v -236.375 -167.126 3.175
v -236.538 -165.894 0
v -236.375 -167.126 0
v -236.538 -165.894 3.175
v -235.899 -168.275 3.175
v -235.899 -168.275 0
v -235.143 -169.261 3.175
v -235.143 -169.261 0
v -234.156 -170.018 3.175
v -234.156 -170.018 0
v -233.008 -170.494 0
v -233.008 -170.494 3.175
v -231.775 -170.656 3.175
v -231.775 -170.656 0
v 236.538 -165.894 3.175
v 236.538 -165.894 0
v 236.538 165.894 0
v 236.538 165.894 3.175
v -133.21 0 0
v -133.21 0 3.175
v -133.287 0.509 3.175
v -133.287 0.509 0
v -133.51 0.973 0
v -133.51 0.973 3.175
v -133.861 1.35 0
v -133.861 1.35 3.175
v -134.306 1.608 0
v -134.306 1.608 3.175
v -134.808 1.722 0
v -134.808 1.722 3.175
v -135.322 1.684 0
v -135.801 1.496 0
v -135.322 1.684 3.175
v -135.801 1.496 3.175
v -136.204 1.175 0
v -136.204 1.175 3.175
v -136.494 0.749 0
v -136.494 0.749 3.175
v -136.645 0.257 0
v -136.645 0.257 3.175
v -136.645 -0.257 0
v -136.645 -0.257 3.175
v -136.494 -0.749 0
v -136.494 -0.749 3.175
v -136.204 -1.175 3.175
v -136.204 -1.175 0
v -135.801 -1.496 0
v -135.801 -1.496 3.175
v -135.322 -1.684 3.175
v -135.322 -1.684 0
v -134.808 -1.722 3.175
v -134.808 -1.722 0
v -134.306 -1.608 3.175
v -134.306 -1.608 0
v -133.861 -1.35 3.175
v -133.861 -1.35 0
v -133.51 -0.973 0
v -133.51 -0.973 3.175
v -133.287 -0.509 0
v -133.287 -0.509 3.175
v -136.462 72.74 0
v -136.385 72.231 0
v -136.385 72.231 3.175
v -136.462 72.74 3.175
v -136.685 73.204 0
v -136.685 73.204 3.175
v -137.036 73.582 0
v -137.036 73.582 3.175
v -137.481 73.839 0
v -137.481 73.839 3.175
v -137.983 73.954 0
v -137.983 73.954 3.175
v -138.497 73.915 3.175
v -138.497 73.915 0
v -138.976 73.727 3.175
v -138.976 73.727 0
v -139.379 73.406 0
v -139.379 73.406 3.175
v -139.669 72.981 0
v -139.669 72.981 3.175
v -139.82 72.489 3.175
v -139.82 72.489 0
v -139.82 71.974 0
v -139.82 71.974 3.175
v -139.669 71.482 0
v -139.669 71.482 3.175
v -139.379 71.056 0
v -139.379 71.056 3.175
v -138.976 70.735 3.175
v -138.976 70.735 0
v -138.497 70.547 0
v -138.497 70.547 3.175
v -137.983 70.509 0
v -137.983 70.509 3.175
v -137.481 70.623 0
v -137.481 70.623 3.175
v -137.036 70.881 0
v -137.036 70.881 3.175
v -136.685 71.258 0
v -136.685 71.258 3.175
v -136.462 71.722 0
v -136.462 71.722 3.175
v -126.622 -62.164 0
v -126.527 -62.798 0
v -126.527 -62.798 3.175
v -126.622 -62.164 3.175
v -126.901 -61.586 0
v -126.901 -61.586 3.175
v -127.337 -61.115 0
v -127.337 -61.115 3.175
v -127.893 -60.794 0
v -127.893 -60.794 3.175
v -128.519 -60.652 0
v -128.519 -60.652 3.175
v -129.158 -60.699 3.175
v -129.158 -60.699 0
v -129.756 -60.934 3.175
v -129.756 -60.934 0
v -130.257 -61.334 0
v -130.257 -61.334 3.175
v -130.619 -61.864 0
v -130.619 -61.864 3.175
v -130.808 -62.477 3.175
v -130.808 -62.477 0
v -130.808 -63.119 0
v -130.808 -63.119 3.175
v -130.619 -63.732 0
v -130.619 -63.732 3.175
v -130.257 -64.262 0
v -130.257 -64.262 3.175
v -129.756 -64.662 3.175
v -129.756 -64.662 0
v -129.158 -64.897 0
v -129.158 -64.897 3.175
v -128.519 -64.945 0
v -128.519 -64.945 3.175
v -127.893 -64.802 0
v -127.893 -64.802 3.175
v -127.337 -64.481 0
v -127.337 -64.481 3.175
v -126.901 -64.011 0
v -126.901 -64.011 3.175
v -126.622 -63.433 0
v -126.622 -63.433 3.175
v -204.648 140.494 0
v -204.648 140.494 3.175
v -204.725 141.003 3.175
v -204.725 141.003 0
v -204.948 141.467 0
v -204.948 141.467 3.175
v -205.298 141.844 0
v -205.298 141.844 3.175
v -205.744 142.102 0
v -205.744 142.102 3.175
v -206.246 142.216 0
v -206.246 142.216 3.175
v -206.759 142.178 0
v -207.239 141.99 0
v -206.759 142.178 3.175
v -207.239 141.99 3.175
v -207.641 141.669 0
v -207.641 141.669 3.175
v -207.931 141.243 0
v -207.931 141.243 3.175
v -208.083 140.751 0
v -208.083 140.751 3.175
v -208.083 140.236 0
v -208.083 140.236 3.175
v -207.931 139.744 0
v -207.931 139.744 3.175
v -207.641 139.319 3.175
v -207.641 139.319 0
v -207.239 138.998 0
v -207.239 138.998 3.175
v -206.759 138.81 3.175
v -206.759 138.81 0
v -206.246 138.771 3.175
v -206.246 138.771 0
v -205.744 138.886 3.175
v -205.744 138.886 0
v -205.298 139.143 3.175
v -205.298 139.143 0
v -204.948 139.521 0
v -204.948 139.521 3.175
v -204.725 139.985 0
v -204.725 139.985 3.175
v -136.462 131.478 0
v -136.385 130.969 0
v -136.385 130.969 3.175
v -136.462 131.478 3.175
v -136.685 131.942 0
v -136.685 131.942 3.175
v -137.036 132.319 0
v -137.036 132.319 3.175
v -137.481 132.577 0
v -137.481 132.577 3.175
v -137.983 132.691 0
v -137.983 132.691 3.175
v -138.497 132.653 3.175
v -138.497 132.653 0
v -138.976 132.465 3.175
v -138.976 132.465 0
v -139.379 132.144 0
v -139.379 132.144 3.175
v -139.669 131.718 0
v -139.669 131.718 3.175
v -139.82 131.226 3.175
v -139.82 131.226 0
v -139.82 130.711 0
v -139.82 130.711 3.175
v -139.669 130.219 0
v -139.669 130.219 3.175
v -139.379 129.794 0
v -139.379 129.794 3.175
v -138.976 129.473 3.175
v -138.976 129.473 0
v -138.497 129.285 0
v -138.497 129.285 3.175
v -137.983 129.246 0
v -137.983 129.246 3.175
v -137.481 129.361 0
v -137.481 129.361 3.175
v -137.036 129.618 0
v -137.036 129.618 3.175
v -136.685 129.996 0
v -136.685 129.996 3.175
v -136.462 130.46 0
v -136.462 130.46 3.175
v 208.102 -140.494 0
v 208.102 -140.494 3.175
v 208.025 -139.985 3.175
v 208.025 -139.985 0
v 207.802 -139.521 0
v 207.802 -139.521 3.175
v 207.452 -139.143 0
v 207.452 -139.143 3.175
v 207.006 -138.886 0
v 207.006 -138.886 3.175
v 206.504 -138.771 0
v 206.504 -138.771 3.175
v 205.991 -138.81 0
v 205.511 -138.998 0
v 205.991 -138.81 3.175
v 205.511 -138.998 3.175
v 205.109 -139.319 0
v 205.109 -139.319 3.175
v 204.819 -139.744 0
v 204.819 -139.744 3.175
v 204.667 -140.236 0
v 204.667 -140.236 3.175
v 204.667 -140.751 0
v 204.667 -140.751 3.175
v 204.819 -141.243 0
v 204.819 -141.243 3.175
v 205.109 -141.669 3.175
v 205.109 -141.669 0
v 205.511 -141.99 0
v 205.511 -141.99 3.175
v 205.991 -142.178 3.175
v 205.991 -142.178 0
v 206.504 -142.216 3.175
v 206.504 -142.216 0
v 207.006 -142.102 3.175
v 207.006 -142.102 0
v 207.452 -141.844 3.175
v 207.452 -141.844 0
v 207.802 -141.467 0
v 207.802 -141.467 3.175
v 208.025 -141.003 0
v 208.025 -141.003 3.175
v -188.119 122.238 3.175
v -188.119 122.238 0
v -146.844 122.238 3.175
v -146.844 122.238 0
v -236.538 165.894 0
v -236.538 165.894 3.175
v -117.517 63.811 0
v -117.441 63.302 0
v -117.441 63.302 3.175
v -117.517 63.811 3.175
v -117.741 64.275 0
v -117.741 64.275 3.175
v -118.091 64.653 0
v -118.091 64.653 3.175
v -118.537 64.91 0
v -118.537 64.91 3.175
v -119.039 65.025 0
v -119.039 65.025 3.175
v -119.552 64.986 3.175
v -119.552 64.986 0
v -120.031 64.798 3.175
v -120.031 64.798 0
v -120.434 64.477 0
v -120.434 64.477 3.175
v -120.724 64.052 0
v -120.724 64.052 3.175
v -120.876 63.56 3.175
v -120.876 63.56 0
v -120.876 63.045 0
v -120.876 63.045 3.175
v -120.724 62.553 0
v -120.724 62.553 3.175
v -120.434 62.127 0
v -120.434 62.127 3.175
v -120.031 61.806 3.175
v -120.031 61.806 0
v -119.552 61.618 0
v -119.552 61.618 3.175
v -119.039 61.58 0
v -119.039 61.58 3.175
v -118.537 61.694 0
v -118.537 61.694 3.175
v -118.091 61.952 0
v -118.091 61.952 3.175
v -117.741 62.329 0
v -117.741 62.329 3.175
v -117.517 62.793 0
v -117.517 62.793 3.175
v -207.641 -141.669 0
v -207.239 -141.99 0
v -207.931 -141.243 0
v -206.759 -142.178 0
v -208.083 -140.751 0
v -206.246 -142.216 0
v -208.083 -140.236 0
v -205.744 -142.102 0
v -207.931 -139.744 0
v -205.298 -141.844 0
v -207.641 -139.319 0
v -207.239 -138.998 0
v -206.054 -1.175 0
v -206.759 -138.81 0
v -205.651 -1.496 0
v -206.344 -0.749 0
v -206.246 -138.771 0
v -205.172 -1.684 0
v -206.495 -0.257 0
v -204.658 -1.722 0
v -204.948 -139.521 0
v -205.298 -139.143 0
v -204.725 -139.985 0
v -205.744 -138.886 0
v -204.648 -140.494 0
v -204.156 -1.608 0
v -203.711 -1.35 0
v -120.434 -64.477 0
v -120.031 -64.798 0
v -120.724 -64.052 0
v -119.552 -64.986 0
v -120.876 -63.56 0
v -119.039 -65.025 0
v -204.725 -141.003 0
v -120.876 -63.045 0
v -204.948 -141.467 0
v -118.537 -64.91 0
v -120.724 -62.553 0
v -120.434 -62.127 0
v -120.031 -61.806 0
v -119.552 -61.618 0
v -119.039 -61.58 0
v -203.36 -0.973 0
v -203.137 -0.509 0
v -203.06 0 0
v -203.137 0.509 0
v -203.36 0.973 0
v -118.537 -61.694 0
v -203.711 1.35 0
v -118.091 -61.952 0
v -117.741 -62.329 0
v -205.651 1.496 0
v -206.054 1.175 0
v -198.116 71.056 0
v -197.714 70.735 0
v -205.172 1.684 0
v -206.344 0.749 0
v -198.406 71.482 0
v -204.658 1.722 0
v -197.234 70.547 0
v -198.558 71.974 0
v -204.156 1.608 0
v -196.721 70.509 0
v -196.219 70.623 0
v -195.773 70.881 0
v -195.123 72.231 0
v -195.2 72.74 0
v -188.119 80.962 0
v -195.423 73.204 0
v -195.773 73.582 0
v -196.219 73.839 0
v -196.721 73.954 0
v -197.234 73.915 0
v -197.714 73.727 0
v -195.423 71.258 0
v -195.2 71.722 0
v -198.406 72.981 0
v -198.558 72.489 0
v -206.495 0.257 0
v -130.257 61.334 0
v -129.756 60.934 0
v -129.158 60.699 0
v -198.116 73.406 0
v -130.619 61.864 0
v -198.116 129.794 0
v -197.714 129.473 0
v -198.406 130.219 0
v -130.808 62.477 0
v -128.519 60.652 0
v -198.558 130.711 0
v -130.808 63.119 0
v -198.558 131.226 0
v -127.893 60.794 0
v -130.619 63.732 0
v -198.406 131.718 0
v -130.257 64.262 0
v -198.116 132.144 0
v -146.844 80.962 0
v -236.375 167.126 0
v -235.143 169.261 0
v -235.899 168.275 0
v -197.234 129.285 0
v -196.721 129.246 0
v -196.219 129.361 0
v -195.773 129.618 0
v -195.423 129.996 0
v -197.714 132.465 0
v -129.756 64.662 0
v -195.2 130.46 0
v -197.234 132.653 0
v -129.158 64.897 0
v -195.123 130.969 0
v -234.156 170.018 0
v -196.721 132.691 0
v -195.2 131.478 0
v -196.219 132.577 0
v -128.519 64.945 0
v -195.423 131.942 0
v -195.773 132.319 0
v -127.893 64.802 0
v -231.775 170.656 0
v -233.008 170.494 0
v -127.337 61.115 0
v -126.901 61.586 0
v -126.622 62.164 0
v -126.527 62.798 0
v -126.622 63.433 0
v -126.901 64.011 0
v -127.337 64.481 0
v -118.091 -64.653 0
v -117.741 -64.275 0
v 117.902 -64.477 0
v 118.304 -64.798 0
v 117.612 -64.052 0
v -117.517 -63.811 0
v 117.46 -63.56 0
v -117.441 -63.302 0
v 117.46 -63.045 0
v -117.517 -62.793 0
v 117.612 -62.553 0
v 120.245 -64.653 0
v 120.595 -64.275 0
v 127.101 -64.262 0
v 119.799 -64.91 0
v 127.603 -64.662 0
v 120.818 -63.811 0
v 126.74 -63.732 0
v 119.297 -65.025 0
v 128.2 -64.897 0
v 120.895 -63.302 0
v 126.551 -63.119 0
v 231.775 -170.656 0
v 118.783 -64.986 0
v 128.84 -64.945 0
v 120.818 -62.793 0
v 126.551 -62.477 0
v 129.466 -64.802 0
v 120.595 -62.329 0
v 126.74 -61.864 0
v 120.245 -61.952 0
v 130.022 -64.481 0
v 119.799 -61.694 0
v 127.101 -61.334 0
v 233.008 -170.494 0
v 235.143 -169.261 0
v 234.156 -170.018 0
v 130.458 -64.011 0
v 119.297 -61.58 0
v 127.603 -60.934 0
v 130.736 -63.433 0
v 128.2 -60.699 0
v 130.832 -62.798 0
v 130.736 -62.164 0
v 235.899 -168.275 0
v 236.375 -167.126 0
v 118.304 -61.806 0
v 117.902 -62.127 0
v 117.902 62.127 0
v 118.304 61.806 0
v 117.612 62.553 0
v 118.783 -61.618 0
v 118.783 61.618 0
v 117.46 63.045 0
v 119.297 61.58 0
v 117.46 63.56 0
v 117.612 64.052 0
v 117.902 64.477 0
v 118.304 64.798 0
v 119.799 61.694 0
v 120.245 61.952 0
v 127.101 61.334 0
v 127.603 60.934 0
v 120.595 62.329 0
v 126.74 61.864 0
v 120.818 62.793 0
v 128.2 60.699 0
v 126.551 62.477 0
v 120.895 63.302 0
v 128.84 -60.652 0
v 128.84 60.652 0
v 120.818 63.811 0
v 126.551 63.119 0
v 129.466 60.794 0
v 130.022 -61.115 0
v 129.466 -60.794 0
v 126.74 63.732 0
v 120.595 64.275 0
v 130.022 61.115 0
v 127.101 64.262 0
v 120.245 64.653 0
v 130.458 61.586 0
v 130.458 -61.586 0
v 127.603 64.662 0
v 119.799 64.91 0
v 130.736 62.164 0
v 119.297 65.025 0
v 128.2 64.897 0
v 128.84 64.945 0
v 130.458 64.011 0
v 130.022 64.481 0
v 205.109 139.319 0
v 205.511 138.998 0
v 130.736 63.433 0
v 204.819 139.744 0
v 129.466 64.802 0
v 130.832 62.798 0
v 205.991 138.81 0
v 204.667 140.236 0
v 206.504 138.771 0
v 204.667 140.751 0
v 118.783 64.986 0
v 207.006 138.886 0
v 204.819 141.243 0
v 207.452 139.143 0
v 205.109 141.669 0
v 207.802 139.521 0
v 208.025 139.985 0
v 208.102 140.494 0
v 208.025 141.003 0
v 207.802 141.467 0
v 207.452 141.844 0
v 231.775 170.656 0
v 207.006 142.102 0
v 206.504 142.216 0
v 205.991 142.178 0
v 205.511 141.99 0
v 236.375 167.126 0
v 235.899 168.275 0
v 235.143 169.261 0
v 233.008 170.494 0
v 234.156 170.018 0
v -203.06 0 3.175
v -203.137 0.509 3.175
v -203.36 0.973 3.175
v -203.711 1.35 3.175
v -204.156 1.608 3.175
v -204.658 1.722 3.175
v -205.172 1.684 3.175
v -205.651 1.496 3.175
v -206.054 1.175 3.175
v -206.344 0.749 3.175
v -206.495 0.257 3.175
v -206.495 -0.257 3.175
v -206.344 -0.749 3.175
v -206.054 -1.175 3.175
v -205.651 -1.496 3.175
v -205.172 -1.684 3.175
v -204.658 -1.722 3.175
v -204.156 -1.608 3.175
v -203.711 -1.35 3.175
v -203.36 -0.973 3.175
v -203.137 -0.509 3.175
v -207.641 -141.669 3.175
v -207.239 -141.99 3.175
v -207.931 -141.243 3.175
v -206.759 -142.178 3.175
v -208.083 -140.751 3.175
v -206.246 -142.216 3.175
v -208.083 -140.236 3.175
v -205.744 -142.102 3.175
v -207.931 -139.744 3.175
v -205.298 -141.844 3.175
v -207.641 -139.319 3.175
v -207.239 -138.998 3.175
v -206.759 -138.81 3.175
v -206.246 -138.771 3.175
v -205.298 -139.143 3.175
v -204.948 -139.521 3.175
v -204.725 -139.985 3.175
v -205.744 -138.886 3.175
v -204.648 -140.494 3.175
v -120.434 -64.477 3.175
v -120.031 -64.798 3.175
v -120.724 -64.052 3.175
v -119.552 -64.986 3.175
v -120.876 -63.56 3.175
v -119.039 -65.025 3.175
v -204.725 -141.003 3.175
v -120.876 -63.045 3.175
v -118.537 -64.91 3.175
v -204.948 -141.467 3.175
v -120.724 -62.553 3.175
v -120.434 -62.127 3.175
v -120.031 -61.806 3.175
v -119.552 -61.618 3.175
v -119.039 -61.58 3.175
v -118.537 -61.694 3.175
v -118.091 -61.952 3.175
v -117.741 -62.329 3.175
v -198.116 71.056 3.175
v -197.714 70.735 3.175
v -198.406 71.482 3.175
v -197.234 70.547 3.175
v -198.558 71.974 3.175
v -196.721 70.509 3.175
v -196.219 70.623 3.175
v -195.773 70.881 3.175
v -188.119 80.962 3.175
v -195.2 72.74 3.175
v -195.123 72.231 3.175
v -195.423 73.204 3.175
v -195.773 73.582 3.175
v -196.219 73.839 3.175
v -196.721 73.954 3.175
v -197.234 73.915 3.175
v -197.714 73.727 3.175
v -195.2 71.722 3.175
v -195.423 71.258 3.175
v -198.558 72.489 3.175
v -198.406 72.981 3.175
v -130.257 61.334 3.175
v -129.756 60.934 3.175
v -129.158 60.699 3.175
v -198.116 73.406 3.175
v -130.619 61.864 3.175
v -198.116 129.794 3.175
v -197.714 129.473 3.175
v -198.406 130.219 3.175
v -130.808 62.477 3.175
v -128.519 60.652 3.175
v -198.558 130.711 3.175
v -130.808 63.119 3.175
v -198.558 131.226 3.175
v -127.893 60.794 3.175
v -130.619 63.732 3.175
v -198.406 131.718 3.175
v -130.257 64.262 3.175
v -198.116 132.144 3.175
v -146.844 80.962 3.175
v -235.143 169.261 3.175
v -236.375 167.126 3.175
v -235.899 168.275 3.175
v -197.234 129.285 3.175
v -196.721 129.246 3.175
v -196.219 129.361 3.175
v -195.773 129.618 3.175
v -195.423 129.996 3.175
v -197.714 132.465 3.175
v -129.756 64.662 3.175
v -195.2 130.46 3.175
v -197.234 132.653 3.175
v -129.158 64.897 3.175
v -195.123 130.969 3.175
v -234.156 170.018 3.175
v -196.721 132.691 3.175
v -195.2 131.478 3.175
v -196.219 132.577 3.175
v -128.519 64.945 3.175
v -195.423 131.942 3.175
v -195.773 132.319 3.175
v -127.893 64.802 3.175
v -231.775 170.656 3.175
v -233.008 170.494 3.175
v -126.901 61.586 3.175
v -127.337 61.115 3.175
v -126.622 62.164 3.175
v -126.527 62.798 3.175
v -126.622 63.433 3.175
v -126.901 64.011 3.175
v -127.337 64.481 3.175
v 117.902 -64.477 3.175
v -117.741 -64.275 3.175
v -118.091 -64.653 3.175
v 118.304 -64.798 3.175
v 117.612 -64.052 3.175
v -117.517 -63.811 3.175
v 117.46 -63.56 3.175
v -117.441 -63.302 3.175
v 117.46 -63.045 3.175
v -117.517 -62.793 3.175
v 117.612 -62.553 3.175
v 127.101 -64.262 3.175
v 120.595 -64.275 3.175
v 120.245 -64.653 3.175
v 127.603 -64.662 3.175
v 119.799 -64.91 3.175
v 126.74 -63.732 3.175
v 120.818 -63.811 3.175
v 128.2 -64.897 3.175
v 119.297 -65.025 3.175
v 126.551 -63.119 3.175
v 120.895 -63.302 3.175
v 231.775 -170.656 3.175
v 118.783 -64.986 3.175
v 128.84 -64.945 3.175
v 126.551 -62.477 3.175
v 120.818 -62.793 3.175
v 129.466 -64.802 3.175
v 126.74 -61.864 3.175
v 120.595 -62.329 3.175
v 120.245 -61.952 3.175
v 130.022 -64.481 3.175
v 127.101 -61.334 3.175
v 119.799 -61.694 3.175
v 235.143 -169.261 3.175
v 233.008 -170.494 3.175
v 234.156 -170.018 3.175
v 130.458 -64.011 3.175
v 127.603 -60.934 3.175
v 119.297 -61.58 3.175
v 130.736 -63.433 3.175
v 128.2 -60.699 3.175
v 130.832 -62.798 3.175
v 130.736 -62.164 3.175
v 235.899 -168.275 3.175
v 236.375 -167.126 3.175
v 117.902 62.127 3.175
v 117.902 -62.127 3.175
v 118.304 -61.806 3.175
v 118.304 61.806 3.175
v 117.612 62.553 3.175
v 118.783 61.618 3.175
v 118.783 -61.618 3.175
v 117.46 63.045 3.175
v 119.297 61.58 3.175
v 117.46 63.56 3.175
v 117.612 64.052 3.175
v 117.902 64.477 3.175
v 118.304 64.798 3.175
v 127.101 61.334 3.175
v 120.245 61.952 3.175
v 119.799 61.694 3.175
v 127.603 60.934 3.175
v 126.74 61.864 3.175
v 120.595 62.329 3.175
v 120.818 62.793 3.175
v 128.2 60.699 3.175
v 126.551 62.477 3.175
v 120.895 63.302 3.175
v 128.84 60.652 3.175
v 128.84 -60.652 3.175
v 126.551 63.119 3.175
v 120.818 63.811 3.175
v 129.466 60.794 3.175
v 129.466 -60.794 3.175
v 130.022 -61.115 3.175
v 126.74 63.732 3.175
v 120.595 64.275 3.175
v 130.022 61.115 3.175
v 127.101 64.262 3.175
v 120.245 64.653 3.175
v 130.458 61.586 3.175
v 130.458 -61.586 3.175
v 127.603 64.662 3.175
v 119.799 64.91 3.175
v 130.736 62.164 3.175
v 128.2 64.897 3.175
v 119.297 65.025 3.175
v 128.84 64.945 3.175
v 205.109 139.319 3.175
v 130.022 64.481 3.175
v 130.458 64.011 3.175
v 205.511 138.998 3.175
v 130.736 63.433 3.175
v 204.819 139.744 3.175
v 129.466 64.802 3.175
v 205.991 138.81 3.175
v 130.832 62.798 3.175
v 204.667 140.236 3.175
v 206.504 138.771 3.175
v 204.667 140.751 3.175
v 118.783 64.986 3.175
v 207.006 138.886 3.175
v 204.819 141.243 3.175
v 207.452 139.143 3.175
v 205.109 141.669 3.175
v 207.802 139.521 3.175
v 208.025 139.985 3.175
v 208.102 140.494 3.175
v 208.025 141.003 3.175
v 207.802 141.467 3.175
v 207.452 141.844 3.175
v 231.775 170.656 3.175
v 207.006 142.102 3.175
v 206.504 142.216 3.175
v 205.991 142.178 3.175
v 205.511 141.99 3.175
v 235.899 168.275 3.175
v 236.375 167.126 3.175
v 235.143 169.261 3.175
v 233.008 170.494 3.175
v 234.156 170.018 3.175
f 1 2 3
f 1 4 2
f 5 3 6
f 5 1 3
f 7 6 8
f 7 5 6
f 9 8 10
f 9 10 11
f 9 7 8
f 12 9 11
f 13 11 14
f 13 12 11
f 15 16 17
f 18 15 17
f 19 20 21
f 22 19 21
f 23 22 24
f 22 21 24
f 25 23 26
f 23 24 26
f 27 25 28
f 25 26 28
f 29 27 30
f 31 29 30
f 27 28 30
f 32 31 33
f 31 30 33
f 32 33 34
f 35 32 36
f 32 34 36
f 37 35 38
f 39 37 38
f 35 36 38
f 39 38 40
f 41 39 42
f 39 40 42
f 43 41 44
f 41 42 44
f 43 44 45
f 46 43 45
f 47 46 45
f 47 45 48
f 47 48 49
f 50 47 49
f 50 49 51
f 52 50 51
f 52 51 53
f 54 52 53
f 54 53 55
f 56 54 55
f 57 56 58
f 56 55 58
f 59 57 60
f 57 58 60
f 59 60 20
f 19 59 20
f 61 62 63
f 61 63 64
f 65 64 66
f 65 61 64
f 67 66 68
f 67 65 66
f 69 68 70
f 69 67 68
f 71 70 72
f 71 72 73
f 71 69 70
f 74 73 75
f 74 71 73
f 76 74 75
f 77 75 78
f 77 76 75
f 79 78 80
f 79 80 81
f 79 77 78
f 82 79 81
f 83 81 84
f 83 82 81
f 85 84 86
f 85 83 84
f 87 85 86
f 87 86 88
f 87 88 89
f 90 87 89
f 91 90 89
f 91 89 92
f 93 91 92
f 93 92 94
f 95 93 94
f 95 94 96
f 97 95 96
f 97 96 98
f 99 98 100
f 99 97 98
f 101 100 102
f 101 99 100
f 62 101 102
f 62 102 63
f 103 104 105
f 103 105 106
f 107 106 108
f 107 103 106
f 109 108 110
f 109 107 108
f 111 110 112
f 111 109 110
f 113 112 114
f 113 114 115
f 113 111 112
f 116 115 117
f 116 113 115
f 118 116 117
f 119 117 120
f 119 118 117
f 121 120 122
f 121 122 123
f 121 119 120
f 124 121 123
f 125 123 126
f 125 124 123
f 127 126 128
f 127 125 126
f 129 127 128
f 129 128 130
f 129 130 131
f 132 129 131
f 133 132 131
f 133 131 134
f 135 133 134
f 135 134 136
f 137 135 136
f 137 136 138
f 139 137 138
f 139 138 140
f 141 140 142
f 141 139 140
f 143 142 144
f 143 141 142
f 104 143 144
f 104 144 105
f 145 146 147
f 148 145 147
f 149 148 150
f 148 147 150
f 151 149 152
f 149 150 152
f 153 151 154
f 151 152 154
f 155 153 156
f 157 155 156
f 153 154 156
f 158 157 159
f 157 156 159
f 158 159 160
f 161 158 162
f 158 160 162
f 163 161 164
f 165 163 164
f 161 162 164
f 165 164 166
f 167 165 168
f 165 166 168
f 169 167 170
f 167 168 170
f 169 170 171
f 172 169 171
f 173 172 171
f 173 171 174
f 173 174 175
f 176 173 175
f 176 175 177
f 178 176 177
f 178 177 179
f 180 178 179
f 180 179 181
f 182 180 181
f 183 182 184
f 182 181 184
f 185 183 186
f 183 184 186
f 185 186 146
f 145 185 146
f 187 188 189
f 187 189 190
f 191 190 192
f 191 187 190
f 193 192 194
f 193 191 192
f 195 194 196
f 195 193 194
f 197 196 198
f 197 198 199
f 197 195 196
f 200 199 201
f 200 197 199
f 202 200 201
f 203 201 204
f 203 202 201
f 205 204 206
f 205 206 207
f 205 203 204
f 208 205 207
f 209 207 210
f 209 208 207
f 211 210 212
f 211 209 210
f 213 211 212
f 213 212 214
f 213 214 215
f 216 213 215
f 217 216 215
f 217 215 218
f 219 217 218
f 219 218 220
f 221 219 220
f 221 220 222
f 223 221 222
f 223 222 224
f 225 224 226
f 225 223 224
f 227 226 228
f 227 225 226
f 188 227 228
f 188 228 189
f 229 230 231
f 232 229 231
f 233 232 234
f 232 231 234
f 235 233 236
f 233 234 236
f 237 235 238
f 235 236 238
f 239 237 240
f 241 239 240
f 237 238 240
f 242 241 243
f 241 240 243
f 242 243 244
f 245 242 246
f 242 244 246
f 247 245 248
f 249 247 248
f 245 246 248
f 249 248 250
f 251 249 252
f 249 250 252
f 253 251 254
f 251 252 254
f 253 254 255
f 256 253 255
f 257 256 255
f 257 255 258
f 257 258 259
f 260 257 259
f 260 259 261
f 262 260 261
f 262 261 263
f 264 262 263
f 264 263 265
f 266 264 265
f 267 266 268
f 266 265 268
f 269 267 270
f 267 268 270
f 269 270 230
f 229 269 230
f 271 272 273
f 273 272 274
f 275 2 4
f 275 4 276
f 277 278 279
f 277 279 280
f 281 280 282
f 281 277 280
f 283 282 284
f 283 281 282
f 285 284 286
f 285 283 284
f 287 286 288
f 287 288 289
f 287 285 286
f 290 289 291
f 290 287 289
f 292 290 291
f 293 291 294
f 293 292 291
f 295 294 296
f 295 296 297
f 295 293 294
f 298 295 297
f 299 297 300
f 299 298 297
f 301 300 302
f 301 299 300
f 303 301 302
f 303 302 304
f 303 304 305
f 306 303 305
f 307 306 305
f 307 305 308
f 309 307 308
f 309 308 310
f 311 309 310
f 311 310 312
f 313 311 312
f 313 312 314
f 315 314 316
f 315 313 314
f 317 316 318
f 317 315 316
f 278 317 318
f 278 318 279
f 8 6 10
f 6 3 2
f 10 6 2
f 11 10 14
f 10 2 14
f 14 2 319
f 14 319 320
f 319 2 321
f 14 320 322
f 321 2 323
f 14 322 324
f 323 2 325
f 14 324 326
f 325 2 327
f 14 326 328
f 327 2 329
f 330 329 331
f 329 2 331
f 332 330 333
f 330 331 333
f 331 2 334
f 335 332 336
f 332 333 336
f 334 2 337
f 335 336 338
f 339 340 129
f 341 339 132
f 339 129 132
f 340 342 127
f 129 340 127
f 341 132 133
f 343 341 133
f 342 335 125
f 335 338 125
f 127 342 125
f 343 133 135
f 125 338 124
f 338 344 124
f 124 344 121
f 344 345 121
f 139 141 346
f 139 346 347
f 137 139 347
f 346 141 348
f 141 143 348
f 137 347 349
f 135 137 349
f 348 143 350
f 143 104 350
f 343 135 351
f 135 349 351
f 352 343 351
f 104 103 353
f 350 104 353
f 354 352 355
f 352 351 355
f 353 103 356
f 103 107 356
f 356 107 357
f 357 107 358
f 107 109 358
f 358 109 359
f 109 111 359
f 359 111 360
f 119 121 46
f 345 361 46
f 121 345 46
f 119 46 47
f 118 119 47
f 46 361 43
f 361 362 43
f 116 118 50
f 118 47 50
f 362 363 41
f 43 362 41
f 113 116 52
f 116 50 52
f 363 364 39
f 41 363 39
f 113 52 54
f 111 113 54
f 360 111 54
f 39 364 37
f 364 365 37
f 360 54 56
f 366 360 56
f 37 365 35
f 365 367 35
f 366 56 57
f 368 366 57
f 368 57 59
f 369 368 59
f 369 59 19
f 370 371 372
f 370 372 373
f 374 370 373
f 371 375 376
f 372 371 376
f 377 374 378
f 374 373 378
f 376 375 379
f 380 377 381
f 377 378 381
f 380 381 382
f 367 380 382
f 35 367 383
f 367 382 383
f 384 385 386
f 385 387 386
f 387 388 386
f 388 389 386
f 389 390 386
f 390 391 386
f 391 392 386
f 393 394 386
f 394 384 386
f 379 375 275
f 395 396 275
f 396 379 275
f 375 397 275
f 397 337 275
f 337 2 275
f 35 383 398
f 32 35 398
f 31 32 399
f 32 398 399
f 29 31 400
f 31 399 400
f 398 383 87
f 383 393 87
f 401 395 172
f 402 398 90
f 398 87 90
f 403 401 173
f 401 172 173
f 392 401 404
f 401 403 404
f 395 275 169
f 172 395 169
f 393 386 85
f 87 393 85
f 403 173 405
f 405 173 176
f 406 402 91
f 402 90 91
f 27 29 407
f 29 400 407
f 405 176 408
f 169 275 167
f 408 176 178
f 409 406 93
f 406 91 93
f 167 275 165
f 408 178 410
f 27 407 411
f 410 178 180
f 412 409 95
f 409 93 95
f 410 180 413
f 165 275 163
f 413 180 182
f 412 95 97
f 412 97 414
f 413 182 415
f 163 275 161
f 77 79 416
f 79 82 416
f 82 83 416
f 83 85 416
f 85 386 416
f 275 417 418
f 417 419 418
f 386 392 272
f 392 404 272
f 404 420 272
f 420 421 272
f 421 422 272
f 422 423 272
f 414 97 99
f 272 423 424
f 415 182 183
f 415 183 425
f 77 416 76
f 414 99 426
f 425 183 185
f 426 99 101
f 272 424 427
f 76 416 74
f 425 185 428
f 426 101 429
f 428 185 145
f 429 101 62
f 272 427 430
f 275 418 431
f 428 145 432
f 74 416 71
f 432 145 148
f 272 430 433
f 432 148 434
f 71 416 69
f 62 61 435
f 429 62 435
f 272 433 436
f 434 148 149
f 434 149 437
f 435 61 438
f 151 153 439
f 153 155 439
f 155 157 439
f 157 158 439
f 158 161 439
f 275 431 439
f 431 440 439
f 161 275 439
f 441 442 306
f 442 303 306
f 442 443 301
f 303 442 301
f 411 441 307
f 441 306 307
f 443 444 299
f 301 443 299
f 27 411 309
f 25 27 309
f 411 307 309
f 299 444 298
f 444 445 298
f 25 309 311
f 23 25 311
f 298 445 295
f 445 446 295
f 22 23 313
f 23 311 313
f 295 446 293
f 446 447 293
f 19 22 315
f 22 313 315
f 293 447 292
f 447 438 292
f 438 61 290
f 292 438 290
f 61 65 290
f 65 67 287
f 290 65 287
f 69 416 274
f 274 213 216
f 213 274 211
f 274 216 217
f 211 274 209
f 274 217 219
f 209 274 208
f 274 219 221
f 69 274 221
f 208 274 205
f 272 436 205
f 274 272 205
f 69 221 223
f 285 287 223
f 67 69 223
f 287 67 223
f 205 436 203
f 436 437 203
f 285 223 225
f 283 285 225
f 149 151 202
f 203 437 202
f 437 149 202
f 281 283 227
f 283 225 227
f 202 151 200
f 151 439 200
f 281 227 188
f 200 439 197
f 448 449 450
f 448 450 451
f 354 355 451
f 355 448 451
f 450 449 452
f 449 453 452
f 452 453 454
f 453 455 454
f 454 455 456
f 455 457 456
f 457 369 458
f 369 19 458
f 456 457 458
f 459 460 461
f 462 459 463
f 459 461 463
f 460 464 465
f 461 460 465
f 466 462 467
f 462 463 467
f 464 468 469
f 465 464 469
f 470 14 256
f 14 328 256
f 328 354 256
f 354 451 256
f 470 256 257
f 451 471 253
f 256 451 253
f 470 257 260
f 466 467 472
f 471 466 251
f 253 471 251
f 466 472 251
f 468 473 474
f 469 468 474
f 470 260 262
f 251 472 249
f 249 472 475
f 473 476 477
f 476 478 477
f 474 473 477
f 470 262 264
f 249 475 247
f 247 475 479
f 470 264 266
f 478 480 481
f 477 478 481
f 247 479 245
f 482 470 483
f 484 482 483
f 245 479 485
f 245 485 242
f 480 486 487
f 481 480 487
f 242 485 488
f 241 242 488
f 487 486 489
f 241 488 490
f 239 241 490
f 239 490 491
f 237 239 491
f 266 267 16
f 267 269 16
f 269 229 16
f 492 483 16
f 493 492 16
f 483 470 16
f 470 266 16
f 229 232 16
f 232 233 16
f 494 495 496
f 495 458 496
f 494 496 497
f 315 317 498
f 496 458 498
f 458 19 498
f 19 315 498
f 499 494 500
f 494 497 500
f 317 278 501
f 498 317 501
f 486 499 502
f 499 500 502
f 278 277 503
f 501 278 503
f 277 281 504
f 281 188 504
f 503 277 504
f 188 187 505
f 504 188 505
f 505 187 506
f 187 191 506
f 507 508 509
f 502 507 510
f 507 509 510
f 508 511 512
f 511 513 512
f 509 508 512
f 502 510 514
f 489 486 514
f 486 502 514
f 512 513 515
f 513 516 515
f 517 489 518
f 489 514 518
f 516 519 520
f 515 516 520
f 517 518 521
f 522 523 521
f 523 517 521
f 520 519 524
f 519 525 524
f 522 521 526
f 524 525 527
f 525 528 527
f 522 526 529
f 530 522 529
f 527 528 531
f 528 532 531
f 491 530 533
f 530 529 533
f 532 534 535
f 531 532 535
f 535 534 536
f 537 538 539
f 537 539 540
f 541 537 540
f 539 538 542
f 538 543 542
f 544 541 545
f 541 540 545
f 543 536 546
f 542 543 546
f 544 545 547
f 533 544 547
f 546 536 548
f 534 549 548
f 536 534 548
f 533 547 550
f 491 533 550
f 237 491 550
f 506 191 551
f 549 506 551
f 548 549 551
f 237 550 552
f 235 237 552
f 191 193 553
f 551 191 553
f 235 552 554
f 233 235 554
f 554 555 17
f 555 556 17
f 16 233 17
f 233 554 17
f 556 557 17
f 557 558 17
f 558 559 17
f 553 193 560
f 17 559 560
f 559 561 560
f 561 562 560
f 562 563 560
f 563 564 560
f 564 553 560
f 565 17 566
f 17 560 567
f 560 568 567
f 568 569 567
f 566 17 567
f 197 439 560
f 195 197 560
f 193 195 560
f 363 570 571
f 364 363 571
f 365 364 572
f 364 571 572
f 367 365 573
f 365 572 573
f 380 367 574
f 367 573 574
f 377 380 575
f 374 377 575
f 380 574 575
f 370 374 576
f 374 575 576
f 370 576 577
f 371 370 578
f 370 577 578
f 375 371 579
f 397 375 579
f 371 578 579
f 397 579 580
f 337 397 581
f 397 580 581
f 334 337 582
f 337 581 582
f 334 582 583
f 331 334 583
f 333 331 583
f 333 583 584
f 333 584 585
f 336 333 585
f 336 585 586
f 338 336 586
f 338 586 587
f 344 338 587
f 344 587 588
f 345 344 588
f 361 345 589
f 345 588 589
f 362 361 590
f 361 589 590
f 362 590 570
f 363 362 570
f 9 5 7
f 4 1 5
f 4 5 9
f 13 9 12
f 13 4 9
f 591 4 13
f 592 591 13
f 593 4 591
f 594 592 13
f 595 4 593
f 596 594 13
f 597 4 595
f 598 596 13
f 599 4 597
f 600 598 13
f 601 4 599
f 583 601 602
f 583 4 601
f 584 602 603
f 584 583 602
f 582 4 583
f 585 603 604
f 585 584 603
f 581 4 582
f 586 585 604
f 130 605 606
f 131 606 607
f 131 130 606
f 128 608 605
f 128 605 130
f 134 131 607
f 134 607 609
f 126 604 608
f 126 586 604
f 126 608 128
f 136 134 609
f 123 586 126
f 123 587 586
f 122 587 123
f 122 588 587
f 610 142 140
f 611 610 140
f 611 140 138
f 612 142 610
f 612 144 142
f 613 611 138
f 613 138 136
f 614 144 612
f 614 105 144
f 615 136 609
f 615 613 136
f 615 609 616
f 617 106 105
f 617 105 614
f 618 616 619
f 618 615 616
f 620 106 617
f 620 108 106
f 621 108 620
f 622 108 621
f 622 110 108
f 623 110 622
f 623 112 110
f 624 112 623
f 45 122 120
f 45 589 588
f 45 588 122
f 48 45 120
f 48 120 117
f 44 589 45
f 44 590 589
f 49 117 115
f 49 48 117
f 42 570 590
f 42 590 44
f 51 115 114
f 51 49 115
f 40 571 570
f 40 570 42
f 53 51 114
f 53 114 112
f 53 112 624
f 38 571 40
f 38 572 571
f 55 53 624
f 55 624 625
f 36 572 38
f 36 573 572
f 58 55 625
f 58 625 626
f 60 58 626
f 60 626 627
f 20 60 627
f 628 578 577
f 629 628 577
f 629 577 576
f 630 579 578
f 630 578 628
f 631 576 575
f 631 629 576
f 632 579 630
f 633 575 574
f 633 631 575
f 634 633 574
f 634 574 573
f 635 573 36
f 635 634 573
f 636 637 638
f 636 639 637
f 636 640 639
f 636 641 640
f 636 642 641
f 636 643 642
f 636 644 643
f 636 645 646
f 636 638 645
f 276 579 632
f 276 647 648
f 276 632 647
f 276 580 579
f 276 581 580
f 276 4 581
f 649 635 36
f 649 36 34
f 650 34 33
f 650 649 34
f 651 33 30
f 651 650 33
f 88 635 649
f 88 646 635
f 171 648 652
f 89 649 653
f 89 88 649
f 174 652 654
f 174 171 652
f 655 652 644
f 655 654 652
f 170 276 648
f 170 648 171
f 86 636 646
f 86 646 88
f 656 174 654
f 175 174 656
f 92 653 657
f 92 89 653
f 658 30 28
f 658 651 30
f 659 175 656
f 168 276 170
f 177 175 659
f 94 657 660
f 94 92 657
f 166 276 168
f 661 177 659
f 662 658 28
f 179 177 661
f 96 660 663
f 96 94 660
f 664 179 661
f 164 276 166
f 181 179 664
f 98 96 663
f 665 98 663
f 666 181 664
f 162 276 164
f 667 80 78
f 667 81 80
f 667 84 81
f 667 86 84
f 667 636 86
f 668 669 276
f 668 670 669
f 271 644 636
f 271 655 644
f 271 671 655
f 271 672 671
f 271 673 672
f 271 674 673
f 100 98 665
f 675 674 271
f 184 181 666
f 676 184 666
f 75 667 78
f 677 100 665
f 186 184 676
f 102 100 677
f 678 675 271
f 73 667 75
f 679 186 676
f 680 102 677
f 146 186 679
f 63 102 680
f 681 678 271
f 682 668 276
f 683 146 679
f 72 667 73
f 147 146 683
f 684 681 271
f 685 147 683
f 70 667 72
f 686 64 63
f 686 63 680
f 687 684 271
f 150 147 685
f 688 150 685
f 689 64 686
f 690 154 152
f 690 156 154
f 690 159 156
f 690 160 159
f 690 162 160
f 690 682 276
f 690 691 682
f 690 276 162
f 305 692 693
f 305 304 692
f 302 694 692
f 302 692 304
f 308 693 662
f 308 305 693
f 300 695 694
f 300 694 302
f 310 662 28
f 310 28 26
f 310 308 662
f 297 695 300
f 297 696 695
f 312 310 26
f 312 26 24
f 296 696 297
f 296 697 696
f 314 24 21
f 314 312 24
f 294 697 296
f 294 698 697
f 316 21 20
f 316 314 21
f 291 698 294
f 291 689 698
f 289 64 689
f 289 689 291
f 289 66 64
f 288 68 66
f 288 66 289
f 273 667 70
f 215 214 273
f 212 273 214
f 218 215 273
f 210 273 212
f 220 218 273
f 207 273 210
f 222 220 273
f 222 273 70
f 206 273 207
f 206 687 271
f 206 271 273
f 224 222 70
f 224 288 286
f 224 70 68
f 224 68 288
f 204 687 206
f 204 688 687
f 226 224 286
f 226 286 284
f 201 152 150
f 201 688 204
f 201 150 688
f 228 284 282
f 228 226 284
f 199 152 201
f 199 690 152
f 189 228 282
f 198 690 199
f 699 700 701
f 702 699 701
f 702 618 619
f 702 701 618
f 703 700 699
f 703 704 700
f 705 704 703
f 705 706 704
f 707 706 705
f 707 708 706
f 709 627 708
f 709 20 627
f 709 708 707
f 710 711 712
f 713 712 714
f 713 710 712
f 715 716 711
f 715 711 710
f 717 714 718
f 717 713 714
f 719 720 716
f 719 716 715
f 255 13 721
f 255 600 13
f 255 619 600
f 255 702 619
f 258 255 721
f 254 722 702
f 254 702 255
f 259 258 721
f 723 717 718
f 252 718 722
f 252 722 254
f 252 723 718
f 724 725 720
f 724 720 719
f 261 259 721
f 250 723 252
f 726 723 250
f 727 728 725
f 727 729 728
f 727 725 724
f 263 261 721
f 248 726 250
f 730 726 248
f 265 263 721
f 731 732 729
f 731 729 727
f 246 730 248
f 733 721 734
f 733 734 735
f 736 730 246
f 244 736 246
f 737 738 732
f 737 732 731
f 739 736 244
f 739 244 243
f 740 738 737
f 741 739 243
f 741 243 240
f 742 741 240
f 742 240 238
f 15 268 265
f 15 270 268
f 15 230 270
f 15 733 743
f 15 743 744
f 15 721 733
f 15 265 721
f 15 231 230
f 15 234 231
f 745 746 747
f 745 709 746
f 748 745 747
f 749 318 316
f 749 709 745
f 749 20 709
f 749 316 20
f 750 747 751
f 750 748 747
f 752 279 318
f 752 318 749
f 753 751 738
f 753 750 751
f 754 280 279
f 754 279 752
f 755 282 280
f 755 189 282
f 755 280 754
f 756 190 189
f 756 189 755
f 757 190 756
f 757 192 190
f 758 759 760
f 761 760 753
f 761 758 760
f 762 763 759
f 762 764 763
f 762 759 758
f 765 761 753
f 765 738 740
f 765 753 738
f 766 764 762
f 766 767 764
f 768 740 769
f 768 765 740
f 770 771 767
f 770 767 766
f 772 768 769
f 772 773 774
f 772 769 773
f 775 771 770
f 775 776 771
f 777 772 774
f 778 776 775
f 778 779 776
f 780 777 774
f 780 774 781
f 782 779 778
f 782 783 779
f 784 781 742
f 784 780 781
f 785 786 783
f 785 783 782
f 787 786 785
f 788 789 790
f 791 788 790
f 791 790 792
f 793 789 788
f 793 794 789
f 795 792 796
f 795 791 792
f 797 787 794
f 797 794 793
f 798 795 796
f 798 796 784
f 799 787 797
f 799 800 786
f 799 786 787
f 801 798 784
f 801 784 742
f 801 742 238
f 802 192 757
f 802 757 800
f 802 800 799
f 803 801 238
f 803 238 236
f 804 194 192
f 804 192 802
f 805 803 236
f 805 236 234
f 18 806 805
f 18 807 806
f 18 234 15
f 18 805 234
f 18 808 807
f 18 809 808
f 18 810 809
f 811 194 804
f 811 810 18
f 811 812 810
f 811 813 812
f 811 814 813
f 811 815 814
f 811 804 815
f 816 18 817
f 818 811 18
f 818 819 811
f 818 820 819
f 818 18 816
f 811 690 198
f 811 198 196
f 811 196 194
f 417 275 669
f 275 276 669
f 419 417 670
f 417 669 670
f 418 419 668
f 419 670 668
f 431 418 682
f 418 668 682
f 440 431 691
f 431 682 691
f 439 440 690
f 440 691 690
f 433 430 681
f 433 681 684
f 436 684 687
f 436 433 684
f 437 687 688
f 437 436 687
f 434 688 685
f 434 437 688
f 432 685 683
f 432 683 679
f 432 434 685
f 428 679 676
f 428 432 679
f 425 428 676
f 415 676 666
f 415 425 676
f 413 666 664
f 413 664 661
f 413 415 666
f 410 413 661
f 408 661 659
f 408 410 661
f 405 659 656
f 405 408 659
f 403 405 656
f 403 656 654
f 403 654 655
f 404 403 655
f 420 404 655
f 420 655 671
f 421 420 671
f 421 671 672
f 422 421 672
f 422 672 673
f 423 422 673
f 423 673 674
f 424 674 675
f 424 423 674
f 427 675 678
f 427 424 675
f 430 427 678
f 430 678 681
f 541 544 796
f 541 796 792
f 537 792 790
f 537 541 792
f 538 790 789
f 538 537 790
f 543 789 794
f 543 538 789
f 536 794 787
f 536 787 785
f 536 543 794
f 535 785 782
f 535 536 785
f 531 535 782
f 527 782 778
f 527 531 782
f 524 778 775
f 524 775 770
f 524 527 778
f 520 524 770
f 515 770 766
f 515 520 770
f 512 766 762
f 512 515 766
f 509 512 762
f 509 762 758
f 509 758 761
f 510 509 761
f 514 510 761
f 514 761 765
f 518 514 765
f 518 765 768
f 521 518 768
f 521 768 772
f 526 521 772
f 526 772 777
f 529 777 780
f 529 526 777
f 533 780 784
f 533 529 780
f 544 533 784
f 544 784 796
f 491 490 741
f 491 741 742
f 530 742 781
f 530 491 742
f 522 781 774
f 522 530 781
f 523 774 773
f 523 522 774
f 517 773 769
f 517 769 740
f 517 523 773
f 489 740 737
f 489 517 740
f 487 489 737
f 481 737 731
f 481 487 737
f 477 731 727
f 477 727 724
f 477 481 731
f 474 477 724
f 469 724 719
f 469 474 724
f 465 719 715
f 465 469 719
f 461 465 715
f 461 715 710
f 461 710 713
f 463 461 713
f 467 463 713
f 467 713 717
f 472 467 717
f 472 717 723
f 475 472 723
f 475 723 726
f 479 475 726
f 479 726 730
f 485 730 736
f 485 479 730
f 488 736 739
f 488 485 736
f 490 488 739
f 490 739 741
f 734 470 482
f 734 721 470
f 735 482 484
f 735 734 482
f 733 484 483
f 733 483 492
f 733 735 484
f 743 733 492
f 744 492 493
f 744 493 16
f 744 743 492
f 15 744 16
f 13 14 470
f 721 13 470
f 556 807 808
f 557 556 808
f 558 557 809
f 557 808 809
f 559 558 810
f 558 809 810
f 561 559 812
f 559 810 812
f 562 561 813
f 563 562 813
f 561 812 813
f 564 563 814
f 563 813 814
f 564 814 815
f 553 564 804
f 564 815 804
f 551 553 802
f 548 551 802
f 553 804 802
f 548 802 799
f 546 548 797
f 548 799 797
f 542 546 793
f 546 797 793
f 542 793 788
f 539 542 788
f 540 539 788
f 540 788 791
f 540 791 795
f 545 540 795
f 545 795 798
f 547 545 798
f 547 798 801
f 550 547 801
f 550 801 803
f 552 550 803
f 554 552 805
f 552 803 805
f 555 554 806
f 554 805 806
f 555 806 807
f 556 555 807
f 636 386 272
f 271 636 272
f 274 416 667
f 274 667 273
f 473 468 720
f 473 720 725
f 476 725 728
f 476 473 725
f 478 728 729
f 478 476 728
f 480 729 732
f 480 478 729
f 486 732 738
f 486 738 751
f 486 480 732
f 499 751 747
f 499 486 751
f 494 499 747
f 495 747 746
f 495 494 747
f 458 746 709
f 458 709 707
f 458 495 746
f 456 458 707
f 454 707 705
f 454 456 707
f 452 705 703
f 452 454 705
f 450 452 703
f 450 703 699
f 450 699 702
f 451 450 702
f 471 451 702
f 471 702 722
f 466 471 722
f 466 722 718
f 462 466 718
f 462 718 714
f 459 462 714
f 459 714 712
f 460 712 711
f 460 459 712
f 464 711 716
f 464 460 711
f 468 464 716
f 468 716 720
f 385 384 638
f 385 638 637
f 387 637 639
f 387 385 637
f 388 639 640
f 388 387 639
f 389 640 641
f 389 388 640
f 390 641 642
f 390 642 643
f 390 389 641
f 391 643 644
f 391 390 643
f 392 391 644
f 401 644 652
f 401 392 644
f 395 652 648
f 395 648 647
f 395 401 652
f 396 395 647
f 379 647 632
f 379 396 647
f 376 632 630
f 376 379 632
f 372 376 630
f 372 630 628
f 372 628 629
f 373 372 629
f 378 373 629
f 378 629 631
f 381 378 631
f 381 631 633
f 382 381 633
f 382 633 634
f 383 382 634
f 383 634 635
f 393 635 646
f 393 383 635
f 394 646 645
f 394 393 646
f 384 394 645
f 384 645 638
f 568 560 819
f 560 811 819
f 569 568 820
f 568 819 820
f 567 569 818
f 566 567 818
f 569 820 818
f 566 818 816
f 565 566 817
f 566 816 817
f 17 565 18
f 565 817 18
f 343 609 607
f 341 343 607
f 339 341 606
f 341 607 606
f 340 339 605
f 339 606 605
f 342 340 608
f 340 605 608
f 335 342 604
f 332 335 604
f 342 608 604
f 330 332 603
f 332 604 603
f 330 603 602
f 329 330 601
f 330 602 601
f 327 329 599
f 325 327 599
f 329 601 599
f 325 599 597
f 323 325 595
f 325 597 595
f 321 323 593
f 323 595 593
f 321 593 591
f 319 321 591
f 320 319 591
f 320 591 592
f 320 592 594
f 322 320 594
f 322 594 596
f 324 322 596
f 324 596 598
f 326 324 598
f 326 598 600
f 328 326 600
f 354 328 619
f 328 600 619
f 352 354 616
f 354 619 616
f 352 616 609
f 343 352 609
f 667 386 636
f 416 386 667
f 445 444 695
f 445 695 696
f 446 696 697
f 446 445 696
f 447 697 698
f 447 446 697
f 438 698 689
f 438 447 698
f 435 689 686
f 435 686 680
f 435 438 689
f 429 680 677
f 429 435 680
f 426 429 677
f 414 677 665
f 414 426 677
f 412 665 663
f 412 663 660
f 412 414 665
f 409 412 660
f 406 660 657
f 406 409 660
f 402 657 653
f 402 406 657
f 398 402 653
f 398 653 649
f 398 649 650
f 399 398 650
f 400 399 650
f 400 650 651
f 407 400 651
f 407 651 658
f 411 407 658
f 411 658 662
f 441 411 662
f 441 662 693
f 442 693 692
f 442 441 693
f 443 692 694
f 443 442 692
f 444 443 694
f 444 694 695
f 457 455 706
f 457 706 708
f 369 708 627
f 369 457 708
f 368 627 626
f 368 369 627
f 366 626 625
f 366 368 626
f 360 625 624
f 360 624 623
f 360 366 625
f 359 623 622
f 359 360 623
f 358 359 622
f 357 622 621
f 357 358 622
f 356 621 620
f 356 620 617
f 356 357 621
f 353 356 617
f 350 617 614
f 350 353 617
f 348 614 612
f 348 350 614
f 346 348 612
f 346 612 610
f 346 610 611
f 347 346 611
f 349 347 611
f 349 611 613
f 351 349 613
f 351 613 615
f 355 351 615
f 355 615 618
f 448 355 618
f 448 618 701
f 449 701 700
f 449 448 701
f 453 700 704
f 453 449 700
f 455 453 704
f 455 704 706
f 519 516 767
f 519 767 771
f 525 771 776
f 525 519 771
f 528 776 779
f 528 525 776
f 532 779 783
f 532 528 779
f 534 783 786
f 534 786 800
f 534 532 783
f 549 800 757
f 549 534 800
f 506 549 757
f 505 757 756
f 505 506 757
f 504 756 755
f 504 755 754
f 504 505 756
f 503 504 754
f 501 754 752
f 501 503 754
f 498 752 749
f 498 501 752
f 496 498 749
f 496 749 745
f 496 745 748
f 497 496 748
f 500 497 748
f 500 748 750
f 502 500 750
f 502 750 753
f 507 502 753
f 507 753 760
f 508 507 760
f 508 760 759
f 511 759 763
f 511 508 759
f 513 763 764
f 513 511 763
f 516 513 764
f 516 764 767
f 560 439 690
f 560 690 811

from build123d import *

# Parameters (mm, degrees)
F0_W     = 473.075
F0_H     = 341.3125
F0_R     = 2.15265
F0_R_2   = 1.7272
F0_W_2   = 41.275
F0_H_2   = 41.275
F1_DEPTH = 3.175
F3_R     = 4.7625
F2_R     = 1.7272
F4_DEPTH = 3.175
F5_R     = 1.7272
F6_DEPTH = 3.175


with BuildPart() as f1:
    # F0 (on Top) → F1 (new body)
    with BuildSketch(Plane.XY):
        Rectangle(F0_W, F0_H)
        with Locations((-128.679393, -62.798143)):
            Circle(F0_R, mode=Mode.SUBTRACT)
        with Locations((-119.167743, -63.302274)):
            Circle(F0_R_2, mode=Mode.SUBTRACT)
        with Locations((119.167743, -63.302274)):
            Circle(F0_R_2, mode=Mode.SUBTRACT)
        with Locations((128.679393, -62.798143)):
            Circle(F0_R, mode=Mode.SUBTRACT)
        with Locations((-196.85, 72.23125)):
            Circle(F0_R_2, mode=Mode.SUBTRACT)
        with Locations((-128.679393, 62.798143)):
            Circle(F0_R, mode=Mode.SUBTRACT)
        with Locations((-119.167743, 63.302274)):
            Circle(F0_R_2, mode=Mode.SUBTRACT)
        with Locations((-138.1125, 72.23125)):
            Circle(F0_R_2, mode=Mode.SUBTRACT)
        with Locations((-167.48125, 101.6)):
            Rectangle(F0_W_2, F0_H_2, mode=Mode.SUBTRACT)
        with Locations((-196.85, 130.96875)):
            Circle(F0_R_2, mode=Mode.SUBTRACT)
        with Locations((-138.1125, 130.96875)):
            Circle(F0_R_2, mode=Mode.SUBTRACT)
        with Locations((119.167743, 63.302274)):
            Circle(F0_R_2, mode=Mode.SUBTRACT)
        with Locations((128.679393, 62.798143)):
            Circle(F0_R, mode=Mode.SUBTRACT)
    extrude(amount=F1_DEPTH)

    # F3
    f3_edges = [f1.edges().sort_by_distance(p)[0] for p in [
        (236.5375, -170.65625, 1.5875),
        (236.5375, 170.65625, 1.5875),
        (-236.5375, 170.65625, 1.5875),
        (-236.5375, -170.65625, 1.5875),
    ]]
    fillet(f3_edges, radius=F3_R)

    # F2 (on face) → F4 (cut, through all)
    with BuildSketch(Plane.XY.offset(3.175)):
        with Locations((-206.375, -140.49375)):
            Circle(F2_R)
        with Locations((-206.375, 140.49375)):
            Circle(F2_R)
        with Locations((206.375, 140.49375)):
            Circle(F2_R)
        with Locations((206.375, -140.49375)):
            Circle(F2_R)
    extrude(amount=-F4_DEPTH, mode=Mode.SUBTRACT)

    # F5 (on face) → F6 (cut, through all)
    with BuildSketch(Plane.XY.offset(3.175)):
        with Locations((-134.937486, 0)):
            Circle(F5_R)
        with Locations((-204.7875, 0)):
            Circle(F5_R)
    extrude(amount=-F6_DEPTH, mode=Mode.SUBTRACT)


solid = f1.part
